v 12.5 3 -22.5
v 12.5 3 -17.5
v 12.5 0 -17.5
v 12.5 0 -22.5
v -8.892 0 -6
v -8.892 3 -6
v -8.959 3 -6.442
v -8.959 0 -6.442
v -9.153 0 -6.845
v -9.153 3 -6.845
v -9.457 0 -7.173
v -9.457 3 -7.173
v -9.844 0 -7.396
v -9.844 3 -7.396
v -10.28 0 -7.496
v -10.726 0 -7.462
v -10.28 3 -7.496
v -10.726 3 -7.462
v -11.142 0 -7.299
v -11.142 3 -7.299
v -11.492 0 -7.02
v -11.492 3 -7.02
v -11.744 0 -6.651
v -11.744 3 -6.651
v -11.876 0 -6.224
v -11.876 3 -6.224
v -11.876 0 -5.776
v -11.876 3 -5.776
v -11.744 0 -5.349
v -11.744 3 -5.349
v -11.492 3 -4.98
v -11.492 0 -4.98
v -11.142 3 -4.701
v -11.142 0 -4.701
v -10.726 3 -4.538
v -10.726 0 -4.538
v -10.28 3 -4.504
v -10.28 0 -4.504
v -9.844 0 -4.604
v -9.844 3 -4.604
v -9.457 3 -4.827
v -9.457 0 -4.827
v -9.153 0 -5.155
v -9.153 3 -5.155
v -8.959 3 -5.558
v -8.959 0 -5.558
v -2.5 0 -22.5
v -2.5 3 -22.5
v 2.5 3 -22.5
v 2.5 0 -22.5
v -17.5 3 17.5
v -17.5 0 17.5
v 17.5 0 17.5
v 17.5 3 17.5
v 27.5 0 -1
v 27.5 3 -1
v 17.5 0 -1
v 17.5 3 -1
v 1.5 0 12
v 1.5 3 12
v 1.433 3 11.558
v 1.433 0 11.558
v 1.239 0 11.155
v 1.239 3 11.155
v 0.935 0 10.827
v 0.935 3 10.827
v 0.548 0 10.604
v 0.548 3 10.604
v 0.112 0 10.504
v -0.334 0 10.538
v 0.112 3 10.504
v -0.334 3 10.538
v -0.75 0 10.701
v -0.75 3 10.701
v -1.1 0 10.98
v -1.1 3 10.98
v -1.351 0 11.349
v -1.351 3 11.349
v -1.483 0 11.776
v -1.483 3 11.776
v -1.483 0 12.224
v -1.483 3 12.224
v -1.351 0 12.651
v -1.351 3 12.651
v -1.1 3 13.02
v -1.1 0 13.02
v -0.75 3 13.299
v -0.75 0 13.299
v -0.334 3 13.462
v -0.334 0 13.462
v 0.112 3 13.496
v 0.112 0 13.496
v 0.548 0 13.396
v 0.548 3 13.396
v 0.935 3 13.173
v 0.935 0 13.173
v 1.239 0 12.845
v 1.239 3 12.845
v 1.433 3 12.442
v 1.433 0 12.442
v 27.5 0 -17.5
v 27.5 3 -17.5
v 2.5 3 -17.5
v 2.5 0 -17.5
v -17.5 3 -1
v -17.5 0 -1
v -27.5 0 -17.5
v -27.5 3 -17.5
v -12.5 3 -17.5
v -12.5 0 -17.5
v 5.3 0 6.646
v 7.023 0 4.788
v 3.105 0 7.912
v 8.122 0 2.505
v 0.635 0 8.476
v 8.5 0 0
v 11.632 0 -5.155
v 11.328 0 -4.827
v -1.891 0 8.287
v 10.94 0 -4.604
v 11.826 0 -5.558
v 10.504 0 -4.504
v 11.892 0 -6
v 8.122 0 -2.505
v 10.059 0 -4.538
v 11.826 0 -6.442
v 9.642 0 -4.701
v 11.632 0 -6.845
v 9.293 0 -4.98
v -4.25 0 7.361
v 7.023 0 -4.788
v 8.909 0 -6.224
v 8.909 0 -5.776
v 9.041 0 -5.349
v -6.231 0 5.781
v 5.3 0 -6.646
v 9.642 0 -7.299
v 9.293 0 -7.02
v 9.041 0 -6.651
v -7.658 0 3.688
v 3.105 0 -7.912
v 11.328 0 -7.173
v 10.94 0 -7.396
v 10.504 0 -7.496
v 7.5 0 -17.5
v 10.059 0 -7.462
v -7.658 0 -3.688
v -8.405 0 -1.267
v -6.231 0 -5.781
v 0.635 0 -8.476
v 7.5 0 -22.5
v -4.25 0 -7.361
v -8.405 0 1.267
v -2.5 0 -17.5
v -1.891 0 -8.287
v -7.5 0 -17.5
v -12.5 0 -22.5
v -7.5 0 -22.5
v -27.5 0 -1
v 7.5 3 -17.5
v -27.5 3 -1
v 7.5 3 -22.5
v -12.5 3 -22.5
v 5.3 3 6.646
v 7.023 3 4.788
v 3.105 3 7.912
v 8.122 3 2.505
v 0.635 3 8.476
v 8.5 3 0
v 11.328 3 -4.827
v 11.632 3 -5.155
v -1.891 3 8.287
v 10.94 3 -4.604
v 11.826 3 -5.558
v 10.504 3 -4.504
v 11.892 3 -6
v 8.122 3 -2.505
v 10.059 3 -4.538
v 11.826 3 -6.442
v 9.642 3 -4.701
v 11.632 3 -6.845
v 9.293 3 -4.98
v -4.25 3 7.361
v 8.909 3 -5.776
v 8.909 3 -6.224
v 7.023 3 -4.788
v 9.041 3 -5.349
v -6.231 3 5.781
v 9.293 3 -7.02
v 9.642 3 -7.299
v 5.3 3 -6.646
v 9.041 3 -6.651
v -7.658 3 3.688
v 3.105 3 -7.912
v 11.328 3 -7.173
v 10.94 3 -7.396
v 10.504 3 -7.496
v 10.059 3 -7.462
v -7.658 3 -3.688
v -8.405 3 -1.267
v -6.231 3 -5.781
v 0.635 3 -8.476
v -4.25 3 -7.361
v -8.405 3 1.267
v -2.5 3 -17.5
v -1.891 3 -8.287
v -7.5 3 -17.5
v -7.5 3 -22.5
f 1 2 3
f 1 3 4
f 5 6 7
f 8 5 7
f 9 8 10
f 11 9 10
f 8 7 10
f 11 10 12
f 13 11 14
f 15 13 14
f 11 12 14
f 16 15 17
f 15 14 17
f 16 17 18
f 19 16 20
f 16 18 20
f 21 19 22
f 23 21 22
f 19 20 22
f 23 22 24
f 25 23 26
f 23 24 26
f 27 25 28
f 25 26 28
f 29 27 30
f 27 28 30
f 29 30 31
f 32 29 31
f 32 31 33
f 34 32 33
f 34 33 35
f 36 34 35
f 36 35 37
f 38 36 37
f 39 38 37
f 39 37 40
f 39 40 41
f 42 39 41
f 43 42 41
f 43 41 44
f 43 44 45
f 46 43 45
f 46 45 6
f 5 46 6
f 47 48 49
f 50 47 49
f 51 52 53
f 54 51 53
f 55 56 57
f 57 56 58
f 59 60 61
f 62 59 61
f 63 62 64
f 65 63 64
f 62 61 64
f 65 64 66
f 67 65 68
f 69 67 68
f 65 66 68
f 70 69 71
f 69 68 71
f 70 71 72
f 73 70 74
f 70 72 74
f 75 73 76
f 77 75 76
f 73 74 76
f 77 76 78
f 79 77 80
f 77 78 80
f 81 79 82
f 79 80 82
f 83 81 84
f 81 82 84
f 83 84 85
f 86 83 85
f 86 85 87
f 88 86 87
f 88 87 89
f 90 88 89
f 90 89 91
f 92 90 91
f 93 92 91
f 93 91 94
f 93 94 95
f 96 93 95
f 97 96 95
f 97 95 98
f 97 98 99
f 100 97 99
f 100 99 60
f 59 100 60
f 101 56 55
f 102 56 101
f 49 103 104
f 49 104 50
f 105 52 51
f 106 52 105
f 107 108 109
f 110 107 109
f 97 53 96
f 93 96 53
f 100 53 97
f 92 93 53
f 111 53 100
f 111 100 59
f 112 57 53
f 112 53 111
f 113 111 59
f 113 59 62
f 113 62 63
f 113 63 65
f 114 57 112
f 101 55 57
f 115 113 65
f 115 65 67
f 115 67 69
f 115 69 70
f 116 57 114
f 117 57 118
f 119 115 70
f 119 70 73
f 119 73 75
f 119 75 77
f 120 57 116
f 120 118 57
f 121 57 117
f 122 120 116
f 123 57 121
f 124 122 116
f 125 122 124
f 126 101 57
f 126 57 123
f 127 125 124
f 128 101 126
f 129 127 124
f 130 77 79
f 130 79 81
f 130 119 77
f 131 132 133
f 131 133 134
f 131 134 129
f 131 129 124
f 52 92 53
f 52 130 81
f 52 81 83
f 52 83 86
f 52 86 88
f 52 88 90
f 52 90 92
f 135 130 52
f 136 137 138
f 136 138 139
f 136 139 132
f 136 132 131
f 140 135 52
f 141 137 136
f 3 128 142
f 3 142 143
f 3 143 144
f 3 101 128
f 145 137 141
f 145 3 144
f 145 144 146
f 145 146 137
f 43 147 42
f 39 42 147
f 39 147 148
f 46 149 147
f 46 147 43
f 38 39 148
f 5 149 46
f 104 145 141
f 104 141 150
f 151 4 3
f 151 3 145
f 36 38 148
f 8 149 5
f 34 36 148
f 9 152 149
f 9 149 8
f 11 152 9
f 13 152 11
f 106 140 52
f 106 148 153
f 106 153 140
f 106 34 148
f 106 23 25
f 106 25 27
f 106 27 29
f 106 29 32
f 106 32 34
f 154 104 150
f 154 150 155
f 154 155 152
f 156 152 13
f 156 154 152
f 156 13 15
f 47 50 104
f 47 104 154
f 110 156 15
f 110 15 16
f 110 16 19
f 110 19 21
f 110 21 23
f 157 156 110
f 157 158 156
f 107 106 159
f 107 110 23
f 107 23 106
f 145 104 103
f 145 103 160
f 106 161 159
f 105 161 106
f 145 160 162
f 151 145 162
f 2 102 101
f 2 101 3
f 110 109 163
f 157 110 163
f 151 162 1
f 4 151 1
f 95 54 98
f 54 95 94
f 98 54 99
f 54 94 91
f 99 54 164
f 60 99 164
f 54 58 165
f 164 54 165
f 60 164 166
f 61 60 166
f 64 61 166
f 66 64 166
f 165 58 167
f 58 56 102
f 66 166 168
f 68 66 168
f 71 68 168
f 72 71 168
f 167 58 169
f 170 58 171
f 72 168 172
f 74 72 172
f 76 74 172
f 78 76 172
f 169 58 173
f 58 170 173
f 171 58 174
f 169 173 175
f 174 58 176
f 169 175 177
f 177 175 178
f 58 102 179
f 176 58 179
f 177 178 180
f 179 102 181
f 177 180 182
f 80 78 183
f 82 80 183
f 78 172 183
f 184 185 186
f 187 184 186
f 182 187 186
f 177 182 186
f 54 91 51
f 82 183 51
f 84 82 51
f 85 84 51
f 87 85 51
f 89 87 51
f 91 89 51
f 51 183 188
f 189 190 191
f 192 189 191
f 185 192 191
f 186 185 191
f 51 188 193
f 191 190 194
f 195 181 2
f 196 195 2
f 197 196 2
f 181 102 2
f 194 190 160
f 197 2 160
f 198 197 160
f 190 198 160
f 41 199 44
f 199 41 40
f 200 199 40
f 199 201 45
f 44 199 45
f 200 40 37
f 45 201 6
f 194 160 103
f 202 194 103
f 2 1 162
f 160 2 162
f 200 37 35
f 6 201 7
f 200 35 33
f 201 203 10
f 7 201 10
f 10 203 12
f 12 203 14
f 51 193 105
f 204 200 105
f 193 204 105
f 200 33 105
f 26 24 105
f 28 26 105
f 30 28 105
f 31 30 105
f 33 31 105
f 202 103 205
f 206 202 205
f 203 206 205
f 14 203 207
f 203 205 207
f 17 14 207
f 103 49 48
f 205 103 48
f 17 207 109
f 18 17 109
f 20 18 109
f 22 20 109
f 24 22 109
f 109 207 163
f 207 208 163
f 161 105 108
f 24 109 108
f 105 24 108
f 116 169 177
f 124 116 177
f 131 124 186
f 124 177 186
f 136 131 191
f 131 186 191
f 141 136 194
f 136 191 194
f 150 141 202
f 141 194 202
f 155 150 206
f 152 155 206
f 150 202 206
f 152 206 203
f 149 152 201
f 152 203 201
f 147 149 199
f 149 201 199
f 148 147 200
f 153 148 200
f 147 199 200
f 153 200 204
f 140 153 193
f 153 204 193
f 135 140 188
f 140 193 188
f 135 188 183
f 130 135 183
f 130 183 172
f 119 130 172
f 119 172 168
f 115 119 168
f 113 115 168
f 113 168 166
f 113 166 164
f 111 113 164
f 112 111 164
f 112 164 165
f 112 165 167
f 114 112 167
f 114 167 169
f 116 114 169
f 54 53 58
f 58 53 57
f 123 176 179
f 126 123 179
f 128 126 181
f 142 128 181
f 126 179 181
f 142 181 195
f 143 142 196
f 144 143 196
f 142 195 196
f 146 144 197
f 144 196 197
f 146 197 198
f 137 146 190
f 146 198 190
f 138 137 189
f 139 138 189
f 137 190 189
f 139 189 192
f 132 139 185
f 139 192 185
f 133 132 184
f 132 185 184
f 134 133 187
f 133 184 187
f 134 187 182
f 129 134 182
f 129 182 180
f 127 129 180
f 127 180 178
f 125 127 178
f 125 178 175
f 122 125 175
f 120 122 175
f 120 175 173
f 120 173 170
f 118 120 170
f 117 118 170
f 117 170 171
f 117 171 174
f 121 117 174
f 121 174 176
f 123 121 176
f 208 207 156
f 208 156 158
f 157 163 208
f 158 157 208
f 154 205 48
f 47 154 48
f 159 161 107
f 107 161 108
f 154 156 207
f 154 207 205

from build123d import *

# Parameters (mm, degrees)
ESQUISSE1_W                = 35
ESQUISSE1_H                = 35
BOSS_EXTRU_1_DEPTH         = 3
ESQUISSE2_W                = 5
ESQUISSE2_H                = 5
BOSS_EXTRU_2_DEPTH         = 3
R_P_TITION_LIN_AIRE1_COUNT = 3
R_P_TITION_LIN_AIRE1_PITCH = 10
ESQUISSE3_R                = 8.5
ESQUISSE3_R_2              = 1.5
ENL_V_MAT_EXTRU_1_DEPTH    = 5
ESQUISSE4_W                = 10
ESQUISSE4_H                = 16.5
BOSS_EXTRU_3_DEPTH         = 3


with BuildPart() as part:
    # Esquisse1 → Boss.-Extru.1 (new body)
    with BuildSketch(Plane(origin=(0, 0, 0), x_dir=(1, 0, 0), z_dir=(0, 1, 0))):
        Rectangle(ESQUISSE1_W, ESQUISSE1_H)
    extrude(amount=BOSS_EXTRU_1_DEPTH)

    # Esquisse2 → Boss.-Extru.2 (add)
    with BuildSketch(Plane(origin=(0, 3, 0), x_dir=(1, 0, 0), z_dir=(0, 1, 0))):
        with Locations((-10, 20)):
            Rectangle(ESQUISSE2_W, ESQUISSE2_H)
    boss_extru_2 = extrude(amount=-BOSS_EXTRU_2_DEPTH)

    # Répétition linéaire1: Boss.-Extru.2 ×3
    with Locations(*[(i * R_P_TITION_LIN_AIRE1_PITCH, 0, 0) for i in range(1, R_P_TITION_LIN_AIRE1_COUNT)]):
        add(boss_extru_2)

    # Esquisse3 → Enlèv. mat.-Extru.1 (cut)
    with BuildSketch(Plane(origin=(0, 3, 0), x_dir=(1, 0, 0), z_dir=(0, 1, 0))):
        Circle(ESQUISSE3_R)
        with Locations((0, -12)):
            Circle(ESQUISSE3_R_2)
        with Locations((-10.392304845, 6)):
            Circle(ESQUISSE3_R_2)
        with Locations((10.392304845, 6)):
            Circle(ESQUISSE3_R_2)
    extrude(amount=-ENL_V_MAT_EXTRU_1_DEPTH, mode=Mode.SUBTRACT)

    # Esquisse4 → Boss.-Extru.3 (add)
    with BuildSketch(Plane(origin=(0, 3, 0), x_dir=(1, 0, 0), z_dir=(0, 1, 0))):
        with Locations((-22.5, 9.25)):
            Rectangle(ESQUISSE4_W, ESQUISSE4_H)
    boss_extru_3 = extrude(amount=-BOSS_EXTRU_3_DEPTH)

    # Symétrie1: Boss.-Extru.3 across plane
    add(boss_extru_3.mirror(Plane(origin=(0, 0, 0), x_dir=(0, 0, 1), z_dir=(1, 0, 0))))


solid = part.part
